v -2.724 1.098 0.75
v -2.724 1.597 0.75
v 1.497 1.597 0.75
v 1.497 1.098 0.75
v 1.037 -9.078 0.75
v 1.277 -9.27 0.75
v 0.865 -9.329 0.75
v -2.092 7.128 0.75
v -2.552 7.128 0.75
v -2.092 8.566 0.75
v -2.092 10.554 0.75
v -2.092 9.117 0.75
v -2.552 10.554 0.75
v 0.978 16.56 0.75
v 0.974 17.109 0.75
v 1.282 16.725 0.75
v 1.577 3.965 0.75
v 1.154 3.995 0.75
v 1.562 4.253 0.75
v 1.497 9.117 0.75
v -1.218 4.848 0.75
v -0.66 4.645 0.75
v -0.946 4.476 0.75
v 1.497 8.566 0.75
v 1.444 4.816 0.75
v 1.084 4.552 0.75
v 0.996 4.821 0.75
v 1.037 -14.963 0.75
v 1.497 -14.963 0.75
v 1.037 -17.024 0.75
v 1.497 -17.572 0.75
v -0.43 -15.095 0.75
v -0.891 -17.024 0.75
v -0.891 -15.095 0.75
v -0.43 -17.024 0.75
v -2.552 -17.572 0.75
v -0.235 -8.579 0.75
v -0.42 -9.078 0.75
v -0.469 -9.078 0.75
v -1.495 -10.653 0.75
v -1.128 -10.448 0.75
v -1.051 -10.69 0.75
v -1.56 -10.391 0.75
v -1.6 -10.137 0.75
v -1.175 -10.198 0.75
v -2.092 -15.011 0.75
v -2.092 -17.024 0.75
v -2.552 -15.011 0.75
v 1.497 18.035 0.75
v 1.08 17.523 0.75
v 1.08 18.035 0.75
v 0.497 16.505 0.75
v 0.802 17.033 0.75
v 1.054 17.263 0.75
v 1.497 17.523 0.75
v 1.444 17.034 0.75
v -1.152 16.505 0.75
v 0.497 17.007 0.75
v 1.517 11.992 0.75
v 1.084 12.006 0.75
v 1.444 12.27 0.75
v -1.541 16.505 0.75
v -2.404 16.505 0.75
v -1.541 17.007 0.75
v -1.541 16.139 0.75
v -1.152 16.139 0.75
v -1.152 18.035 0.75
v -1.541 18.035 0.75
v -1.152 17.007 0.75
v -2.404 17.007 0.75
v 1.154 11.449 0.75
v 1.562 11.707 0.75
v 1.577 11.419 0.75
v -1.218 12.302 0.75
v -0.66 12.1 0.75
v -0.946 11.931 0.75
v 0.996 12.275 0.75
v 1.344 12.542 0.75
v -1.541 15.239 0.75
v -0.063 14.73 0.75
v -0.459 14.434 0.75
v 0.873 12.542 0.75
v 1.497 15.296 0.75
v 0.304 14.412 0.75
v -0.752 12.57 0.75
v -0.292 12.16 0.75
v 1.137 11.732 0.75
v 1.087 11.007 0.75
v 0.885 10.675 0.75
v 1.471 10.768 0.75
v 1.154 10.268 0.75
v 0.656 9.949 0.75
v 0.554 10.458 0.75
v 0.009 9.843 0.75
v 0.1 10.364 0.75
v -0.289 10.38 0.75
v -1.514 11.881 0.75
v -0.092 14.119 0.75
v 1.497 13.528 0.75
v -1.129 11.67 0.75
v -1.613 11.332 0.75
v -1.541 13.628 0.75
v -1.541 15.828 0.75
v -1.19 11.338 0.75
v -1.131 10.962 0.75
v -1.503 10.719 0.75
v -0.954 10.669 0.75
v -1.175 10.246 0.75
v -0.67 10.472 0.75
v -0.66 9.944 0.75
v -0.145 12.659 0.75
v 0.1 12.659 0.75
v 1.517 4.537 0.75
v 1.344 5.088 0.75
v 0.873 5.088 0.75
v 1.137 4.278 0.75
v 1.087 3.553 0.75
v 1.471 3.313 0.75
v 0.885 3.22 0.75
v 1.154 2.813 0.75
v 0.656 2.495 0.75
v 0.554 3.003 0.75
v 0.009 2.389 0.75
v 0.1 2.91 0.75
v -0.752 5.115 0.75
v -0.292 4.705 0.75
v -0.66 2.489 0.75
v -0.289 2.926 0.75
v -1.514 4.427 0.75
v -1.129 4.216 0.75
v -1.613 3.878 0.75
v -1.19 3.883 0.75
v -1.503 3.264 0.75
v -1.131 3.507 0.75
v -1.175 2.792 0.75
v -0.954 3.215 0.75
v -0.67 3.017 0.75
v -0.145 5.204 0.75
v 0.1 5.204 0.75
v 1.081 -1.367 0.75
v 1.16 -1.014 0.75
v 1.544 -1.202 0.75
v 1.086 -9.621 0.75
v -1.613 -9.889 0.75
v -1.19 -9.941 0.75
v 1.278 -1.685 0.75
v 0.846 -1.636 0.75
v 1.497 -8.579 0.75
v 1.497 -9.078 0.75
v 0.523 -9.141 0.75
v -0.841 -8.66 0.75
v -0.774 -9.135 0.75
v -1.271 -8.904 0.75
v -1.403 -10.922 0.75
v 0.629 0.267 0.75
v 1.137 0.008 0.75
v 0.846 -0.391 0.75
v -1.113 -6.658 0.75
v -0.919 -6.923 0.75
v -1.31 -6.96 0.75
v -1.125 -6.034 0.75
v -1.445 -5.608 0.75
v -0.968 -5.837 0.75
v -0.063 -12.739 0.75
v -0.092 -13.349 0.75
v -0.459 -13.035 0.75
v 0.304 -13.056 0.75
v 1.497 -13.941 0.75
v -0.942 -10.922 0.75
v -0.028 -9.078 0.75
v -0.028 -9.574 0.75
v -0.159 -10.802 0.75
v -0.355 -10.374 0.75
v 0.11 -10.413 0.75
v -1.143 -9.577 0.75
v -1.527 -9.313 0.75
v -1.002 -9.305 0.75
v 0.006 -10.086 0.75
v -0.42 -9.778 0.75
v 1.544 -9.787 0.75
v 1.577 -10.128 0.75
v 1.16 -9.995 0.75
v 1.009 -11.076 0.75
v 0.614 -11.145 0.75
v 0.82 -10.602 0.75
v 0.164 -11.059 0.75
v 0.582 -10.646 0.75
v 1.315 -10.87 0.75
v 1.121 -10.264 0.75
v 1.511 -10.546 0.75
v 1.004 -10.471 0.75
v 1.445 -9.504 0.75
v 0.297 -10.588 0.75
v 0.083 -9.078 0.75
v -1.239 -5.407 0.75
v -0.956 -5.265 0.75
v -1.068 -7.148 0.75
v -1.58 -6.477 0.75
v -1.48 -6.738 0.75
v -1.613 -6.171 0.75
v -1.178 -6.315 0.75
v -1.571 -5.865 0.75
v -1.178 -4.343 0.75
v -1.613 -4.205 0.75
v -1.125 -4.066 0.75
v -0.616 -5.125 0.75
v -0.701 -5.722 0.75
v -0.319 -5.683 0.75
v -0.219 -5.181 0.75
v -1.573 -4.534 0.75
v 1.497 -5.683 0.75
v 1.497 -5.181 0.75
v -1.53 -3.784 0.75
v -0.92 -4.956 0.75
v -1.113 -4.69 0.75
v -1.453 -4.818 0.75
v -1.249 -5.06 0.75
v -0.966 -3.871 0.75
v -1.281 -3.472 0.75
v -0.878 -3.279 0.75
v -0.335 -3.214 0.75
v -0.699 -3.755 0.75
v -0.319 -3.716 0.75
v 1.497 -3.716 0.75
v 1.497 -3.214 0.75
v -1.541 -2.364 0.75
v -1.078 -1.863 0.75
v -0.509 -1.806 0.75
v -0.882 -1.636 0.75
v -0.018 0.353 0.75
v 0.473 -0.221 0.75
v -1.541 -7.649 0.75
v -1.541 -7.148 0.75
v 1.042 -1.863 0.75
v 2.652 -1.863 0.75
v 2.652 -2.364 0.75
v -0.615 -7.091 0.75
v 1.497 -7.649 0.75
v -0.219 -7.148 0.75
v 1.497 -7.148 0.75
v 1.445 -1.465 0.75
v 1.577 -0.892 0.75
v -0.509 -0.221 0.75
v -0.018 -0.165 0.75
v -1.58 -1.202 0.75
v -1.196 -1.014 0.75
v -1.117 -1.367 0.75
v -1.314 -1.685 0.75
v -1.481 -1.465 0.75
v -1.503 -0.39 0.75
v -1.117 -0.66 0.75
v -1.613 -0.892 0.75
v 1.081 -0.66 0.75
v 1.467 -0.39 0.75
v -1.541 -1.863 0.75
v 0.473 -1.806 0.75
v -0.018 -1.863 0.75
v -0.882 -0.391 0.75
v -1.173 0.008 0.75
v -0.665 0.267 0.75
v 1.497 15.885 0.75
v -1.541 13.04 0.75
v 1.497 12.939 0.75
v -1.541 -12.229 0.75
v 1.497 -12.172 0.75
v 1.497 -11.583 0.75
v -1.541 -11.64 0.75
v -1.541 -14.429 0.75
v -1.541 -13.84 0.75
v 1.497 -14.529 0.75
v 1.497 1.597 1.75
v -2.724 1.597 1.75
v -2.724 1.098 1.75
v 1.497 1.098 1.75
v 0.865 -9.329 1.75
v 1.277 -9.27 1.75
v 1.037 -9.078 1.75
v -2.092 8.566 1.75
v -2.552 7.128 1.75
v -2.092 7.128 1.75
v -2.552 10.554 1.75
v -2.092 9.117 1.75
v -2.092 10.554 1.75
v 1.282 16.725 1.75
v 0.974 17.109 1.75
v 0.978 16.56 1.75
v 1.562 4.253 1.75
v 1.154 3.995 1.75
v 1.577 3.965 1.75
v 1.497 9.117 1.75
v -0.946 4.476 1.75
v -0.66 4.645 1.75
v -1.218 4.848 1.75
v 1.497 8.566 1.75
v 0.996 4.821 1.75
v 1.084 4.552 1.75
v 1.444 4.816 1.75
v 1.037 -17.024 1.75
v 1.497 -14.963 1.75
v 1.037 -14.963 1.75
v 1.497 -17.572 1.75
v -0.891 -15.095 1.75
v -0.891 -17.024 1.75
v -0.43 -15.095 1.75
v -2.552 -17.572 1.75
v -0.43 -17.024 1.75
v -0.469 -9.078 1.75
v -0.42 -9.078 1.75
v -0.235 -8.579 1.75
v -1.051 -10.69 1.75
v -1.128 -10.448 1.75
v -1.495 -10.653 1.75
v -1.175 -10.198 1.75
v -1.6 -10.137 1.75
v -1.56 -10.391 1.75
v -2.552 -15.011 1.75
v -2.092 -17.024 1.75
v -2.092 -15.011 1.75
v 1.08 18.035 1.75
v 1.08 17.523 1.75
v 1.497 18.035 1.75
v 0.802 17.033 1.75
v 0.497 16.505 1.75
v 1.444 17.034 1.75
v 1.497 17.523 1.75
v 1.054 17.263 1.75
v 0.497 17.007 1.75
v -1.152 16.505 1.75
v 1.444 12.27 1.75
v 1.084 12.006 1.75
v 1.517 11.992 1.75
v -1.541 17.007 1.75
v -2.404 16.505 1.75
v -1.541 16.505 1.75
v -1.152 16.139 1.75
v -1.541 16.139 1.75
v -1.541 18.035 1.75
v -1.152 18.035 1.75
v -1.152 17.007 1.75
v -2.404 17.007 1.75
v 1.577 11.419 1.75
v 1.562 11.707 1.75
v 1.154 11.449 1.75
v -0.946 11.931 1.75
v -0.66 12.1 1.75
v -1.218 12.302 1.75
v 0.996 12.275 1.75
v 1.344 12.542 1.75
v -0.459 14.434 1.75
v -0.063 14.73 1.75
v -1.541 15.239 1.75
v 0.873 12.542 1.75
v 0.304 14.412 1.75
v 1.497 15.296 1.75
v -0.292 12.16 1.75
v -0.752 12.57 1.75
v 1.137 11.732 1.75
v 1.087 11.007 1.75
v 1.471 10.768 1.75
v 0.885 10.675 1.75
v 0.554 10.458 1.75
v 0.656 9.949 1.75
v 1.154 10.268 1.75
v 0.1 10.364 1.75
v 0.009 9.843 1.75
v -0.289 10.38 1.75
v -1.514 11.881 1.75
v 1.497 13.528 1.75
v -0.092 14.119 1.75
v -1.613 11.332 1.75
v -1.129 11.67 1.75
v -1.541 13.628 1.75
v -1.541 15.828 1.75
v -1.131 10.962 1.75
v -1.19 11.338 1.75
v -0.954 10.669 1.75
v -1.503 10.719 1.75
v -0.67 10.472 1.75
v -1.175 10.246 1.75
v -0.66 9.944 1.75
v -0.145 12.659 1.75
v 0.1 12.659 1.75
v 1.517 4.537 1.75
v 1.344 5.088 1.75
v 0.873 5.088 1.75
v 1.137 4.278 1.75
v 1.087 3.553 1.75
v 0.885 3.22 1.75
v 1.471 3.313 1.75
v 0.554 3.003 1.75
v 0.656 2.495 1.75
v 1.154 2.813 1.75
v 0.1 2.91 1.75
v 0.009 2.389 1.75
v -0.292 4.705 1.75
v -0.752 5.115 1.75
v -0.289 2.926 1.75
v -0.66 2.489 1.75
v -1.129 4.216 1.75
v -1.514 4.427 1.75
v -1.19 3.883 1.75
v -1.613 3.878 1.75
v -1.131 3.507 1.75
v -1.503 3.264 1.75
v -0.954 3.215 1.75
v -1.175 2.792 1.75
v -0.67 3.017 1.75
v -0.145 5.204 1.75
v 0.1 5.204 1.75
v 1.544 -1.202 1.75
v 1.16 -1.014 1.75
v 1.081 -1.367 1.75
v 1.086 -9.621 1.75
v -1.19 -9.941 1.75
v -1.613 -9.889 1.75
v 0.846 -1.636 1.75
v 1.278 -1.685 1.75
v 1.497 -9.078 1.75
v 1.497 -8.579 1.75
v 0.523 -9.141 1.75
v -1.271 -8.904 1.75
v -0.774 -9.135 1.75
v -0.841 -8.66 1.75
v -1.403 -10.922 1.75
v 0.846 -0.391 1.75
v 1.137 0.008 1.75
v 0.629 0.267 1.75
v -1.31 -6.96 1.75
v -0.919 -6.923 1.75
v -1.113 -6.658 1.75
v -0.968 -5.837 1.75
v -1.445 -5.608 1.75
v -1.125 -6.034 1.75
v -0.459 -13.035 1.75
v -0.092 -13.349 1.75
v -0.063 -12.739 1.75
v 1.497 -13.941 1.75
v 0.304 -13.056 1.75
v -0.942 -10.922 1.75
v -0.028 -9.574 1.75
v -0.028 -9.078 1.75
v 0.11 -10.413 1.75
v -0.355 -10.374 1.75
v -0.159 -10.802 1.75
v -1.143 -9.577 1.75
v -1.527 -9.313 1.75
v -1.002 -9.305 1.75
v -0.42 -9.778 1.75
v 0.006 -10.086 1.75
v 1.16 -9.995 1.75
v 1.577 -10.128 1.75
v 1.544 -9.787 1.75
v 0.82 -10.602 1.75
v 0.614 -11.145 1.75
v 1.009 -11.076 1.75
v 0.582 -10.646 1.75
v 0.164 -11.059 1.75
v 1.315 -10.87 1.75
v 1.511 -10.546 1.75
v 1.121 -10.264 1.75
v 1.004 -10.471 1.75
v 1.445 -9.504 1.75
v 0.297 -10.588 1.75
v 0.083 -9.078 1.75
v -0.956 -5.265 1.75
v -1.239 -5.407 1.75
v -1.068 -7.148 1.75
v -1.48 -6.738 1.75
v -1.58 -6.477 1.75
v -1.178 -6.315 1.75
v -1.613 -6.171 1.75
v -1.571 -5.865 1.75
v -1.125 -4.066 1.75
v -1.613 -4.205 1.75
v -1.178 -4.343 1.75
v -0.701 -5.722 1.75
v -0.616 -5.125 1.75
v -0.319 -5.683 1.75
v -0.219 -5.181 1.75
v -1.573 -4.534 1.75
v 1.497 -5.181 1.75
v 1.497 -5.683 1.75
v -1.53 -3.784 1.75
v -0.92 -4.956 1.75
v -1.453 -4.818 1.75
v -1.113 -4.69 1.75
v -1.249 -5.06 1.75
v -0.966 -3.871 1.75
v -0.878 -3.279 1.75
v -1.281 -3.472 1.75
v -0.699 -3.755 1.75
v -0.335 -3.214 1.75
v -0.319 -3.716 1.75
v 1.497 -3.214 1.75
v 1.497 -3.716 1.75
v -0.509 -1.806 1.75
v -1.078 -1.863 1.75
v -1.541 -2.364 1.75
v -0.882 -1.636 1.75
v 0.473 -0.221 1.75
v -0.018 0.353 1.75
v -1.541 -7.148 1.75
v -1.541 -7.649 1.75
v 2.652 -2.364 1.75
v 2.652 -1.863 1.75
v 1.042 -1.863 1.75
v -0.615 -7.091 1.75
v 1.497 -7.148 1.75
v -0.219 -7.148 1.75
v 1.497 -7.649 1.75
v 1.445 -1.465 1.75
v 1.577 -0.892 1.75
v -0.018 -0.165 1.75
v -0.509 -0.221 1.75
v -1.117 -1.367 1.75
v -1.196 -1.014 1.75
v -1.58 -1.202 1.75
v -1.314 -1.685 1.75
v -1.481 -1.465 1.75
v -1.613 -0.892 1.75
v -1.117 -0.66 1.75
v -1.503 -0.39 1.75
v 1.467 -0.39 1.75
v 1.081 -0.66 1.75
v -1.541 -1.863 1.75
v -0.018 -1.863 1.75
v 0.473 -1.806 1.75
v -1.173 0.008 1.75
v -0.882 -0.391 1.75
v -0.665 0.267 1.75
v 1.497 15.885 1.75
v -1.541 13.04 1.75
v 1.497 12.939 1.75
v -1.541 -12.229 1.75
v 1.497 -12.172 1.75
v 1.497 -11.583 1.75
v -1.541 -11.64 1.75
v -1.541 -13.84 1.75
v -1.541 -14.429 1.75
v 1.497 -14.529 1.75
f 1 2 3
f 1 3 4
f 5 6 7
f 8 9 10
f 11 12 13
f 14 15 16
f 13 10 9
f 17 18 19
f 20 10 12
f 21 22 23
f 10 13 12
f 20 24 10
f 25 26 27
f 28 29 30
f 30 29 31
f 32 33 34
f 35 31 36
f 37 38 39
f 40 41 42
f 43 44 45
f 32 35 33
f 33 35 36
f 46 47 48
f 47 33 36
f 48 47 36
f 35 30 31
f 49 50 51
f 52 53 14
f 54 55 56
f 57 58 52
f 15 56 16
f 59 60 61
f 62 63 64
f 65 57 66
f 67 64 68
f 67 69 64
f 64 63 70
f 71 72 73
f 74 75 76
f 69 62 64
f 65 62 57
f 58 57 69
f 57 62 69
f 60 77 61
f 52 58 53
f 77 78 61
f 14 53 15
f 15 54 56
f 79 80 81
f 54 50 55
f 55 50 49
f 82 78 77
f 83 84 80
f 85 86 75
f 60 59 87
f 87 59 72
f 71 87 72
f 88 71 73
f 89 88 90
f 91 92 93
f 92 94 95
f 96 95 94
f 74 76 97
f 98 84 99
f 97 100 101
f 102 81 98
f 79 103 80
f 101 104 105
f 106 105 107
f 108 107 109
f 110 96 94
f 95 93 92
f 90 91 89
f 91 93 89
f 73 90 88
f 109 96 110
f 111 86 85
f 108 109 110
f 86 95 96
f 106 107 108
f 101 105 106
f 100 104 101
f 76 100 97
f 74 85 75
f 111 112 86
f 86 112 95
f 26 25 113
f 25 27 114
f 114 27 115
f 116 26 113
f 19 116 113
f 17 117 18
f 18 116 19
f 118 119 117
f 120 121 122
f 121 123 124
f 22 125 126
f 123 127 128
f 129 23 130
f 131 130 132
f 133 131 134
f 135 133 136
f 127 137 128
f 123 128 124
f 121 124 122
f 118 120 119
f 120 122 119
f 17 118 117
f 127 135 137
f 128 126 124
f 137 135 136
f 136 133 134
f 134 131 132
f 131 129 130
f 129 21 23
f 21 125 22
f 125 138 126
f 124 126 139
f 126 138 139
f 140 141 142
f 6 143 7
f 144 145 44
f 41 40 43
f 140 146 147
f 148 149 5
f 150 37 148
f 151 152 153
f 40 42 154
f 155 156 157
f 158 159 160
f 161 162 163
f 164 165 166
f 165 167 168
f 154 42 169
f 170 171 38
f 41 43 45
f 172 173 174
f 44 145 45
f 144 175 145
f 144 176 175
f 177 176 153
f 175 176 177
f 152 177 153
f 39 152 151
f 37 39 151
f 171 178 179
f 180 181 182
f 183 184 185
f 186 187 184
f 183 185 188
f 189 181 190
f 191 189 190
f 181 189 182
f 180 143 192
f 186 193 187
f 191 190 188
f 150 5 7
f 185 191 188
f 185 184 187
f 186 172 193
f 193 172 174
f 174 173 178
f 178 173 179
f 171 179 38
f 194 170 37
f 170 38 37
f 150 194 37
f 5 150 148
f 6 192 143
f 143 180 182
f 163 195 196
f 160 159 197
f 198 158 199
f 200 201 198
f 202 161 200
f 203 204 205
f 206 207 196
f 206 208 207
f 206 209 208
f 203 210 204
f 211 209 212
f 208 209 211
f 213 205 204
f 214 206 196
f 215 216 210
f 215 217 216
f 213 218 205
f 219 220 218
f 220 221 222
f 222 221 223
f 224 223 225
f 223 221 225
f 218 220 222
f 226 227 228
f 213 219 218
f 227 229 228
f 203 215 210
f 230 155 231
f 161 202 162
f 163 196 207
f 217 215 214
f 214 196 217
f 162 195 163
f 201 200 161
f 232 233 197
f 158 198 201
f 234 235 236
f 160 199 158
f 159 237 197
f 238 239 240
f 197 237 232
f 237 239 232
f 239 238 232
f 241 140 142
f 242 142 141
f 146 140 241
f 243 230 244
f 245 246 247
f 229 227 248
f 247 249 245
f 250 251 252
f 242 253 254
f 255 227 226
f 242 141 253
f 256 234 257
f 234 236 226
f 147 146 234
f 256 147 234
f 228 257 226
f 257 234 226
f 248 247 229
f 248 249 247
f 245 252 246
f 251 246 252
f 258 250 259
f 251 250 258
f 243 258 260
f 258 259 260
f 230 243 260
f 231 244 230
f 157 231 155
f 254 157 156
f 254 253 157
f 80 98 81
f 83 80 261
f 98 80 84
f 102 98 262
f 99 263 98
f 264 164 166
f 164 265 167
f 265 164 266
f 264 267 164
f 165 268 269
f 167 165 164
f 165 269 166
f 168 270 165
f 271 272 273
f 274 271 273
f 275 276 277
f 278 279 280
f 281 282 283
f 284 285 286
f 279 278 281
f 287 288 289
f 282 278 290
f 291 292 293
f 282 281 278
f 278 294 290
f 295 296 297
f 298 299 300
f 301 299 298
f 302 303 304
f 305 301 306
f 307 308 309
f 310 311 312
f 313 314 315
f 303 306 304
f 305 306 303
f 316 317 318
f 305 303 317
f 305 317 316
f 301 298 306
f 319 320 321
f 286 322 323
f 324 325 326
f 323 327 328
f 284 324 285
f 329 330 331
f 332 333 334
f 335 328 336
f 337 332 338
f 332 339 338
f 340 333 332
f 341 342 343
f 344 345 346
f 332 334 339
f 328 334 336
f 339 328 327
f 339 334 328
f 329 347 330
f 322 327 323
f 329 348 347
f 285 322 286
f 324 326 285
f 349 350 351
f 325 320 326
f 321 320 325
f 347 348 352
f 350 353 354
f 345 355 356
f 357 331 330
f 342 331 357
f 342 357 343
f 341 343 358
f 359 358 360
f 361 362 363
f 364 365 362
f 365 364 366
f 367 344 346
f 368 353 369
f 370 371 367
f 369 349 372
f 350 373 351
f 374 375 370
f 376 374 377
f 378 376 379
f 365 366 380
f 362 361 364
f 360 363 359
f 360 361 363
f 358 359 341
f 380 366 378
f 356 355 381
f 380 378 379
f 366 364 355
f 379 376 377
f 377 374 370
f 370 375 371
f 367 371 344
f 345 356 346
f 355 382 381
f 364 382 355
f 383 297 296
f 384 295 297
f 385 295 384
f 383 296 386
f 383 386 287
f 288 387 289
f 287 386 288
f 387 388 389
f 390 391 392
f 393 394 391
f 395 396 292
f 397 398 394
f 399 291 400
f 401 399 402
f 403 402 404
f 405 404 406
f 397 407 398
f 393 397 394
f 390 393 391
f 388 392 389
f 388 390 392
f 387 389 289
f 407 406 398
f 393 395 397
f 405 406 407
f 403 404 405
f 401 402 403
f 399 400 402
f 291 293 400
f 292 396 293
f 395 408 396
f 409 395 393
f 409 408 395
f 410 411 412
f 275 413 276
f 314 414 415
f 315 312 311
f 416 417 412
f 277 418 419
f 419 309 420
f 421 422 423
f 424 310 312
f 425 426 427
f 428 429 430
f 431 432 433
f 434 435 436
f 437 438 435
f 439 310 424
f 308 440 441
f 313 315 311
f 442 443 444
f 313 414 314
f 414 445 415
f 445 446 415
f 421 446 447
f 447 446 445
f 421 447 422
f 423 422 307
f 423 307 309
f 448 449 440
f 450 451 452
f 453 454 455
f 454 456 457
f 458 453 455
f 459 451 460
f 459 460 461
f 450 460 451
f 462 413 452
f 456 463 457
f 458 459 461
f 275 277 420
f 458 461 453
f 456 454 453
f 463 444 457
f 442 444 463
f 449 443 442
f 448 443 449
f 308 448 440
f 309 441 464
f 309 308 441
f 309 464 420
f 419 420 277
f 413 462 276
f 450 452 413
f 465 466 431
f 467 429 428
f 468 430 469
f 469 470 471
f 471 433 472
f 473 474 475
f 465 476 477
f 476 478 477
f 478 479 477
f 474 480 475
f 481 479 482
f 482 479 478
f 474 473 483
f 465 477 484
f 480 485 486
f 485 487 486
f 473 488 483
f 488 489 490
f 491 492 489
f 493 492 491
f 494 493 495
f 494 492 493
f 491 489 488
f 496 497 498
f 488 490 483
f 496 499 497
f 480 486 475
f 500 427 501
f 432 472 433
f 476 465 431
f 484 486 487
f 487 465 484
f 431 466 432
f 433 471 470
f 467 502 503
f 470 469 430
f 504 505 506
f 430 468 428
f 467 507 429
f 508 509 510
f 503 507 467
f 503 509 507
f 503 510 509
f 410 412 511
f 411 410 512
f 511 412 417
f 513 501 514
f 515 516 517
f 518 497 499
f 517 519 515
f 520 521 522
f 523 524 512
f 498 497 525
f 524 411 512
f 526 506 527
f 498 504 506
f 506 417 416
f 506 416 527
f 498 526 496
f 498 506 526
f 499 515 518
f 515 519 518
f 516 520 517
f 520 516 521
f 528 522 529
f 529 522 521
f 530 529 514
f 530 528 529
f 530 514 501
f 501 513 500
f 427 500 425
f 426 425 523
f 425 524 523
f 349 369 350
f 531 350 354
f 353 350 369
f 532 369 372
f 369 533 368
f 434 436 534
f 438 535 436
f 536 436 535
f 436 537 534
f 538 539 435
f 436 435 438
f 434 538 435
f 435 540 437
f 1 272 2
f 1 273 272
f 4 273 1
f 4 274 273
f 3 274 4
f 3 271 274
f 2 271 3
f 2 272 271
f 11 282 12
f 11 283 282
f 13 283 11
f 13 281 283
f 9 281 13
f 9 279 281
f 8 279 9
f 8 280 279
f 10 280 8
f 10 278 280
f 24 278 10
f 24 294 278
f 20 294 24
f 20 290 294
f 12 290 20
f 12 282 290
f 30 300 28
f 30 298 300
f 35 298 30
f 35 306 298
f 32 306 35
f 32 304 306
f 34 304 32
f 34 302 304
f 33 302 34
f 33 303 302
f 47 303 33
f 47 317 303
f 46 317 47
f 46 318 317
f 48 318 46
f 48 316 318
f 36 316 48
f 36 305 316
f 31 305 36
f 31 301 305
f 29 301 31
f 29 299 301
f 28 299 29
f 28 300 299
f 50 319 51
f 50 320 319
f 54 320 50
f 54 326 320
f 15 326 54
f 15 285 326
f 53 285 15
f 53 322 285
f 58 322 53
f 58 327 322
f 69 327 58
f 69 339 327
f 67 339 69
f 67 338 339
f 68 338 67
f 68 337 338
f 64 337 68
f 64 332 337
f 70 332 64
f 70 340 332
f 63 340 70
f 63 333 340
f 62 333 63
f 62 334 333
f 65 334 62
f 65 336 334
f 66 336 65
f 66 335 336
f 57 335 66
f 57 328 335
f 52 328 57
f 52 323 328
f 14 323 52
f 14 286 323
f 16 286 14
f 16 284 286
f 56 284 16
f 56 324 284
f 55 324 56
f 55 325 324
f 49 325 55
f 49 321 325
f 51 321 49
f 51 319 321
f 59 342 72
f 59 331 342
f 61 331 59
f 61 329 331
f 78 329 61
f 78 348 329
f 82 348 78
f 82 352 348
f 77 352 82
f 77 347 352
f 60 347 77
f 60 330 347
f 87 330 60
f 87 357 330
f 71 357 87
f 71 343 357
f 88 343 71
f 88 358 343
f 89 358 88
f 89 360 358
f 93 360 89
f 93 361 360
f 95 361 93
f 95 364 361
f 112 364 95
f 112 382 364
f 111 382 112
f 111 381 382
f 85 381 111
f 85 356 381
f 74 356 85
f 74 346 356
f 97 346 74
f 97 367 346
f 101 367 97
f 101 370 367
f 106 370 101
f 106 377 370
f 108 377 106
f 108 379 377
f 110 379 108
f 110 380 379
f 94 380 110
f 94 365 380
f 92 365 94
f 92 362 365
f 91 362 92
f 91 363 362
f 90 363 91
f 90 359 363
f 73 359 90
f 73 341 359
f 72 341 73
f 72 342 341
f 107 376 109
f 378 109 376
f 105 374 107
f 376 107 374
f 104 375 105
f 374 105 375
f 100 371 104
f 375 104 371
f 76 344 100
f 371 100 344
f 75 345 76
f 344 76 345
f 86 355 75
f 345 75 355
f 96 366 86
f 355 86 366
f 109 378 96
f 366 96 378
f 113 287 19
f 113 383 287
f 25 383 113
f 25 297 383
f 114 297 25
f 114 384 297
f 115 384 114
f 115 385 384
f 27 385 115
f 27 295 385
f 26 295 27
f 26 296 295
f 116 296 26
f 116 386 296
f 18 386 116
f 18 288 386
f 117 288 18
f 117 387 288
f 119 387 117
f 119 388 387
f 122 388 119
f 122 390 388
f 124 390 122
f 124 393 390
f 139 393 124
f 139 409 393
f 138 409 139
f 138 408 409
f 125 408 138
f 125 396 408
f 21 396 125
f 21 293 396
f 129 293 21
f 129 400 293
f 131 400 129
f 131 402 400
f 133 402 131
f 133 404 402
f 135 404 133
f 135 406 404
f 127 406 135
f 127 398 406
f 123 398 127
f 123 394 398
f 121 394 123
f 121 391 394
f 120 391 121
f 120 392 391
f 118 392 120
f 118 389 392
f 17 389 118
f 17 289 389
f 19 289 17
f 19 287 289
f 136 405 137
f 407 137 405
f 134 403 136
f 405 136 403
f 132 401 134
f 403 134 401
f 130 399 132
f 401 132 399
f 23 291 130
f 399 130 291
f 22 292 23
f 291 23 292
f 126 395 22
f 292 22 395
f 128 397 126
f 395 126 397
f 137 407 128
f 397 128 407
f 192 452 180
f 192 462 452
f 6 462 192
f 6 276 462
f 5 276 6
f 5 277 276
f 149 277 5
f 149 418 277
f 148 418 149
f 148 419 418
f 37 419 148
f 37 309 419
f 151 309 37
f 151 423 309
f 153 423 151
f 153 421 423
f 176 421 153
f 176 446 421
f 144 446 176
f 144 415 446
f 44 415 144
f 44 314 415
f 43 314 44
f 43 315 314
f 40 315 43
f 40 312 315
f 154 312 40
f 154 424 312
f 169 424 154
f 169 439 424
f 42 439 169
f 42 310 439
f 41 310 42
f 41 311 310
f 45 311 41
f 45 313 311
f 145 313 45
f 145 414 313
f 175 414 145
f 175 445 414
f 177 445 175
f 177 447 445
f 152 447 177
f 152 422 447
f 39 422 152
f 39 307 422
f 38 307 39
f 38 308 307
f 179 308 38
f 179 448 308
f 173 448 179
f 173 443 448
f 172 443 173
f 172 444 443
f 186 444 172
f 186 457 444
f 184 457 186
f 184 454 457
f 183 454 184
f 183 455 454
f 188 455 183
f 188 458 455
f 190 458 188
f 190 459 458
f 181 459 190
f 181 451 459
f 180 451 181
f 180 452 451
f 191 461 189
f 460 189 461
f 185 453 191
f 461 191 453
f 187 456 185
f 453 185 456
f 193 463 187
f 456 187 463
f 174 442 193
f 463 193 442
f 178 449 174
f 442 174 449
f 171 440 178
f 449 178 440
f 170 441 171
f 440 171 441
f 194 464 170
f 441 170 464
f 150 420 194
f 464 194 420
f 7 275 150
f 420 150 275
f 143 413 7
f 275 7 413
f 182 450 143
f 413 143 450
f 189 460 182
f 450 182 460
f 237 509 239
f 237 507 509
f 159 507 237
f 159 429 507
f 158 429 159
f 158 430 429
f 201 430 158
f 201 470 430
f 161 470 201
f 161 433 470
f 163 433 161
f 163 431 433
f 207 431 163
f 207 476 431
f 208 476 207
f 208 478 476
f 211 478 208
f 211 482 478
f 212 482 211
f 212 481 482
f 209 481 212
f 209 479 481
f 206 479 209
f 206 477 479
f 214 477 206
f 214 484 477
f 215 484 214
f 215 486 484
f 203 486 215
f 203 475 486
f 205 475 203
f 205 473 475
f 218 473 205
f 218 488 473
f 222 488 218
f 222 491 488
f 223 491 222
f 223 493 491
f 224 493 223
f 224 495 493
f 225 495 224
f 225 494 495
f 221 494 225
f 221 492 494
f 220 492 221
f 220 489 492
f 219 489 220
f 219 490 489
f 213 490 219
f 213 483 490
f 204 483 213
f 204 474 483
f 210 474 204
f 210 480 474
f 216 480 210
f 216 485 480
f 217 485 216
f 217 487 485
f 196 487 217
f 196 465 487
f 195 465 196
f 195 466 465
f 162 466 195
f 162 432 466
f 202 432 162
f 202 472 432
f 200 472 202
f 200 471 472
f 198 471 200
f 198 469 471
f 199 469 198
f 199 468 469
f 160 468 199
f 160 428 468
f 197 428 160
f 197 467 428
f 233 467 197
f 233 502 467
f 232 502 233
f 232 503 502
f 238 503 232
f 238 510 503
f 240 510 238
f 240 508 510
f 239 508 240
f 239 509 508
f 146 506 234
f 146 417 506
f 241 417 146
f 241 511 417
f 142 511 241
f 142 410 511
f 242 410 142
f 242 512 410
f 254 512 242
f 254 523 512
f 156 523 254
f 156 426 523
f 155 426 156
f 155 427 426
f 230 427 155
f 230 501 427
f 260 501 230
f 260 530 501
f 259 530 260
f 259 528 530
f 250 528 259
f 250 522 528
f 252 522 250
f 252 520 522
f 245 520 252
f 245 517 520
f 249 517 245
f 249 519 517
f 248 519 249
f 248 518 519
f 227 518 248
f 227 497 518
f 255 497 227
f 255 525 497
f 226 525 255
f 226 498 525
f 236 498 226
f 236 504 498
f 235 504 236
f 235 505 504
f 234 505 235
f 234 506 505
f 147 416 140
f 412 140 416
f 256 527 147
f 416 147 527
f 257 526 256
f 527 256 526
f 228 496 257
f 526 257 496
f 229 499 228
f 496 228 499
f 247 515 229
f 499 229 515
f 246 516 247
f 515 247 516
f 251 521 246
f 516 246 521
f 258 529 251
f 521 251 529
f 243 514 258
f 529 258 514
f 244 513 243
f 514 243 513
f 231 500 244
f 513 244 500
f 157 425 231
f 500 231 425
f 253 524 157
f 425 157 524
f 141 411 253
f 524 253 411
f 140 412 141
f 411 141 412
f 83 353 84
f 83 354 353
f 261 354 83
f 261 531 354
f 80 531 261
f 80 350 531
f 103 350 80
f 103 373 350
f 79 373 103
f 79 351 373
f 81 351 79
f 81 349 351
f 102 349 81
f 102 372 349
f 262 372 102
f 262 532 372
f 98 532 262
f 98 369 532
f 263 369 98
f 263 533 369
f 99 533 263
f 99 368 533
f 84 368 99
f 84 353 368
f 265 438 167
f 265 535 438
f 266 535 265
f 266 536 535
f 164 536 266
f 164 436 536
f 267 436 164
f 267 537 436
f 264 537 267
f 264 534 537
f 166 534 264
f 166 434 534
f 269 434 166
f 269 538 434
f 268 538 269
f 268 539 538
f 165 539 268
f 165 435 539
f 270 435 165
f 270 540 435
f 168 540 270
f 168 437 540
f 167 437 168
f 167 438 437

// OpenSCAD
// Text to put on the plant sign
text="Example Text";

// Font size (mm): The generated text will have approximately an ascent of the given value (height above the baseline).  Note that specific fonts will vary somewhat and may not fill the size specified exactly, usually slightly smaller.
size=4;

// Font to use (any font.google.com should work and other common ones too)
font="Oswald";

module rounded_square(size, r=1) {
    x=size[0];
    y=size[1];
    union() {
        translate([r,r]) circle(r=r, $fn=50);
        translate([r,y-r]) circle(r=r, $fn=50);
        translate([x-r,r]) circle(r=r, $fn=50);
        translate([x-r,y-r]) circle(r=r, $fn=50);
        translate([0,r]) square([x,y-(r*2)]);
        translate([r,0]) square([x-(r*2),y]);
    }
}

module rounded_cube(size, r=1) {
    linear_extrude(height=size[2]) rounded_square(size=size, r=r);
}

// If thingiverse let you import stls then I could enable this to let anyone generate their own single colour signs.  Alas, not yet...

// Either generate the full "sign" or just the "text" (to use as part of a multi-colour print)
mode="text";    // [sign, text]

module label() {
    label=[22,39,0.7];
    translate([-label[0]/2, -label[1]/2, 0.5]) rounded_cube(label, r=2.5);
}

module outer() {
    difference() {
        import("stl/plant_label.stl");
        label();
    }
}

module _text() {
    translate([0,0,0.75]) rotate([0, 0, 90]) linear_extrude(height=1) text(font=font, text=text, size=size, halign="center", valign="center");
}

if (mode == "sign") {
    outer();
    label();
    _text();
}

if (mode == "text") {
    _text();
}
